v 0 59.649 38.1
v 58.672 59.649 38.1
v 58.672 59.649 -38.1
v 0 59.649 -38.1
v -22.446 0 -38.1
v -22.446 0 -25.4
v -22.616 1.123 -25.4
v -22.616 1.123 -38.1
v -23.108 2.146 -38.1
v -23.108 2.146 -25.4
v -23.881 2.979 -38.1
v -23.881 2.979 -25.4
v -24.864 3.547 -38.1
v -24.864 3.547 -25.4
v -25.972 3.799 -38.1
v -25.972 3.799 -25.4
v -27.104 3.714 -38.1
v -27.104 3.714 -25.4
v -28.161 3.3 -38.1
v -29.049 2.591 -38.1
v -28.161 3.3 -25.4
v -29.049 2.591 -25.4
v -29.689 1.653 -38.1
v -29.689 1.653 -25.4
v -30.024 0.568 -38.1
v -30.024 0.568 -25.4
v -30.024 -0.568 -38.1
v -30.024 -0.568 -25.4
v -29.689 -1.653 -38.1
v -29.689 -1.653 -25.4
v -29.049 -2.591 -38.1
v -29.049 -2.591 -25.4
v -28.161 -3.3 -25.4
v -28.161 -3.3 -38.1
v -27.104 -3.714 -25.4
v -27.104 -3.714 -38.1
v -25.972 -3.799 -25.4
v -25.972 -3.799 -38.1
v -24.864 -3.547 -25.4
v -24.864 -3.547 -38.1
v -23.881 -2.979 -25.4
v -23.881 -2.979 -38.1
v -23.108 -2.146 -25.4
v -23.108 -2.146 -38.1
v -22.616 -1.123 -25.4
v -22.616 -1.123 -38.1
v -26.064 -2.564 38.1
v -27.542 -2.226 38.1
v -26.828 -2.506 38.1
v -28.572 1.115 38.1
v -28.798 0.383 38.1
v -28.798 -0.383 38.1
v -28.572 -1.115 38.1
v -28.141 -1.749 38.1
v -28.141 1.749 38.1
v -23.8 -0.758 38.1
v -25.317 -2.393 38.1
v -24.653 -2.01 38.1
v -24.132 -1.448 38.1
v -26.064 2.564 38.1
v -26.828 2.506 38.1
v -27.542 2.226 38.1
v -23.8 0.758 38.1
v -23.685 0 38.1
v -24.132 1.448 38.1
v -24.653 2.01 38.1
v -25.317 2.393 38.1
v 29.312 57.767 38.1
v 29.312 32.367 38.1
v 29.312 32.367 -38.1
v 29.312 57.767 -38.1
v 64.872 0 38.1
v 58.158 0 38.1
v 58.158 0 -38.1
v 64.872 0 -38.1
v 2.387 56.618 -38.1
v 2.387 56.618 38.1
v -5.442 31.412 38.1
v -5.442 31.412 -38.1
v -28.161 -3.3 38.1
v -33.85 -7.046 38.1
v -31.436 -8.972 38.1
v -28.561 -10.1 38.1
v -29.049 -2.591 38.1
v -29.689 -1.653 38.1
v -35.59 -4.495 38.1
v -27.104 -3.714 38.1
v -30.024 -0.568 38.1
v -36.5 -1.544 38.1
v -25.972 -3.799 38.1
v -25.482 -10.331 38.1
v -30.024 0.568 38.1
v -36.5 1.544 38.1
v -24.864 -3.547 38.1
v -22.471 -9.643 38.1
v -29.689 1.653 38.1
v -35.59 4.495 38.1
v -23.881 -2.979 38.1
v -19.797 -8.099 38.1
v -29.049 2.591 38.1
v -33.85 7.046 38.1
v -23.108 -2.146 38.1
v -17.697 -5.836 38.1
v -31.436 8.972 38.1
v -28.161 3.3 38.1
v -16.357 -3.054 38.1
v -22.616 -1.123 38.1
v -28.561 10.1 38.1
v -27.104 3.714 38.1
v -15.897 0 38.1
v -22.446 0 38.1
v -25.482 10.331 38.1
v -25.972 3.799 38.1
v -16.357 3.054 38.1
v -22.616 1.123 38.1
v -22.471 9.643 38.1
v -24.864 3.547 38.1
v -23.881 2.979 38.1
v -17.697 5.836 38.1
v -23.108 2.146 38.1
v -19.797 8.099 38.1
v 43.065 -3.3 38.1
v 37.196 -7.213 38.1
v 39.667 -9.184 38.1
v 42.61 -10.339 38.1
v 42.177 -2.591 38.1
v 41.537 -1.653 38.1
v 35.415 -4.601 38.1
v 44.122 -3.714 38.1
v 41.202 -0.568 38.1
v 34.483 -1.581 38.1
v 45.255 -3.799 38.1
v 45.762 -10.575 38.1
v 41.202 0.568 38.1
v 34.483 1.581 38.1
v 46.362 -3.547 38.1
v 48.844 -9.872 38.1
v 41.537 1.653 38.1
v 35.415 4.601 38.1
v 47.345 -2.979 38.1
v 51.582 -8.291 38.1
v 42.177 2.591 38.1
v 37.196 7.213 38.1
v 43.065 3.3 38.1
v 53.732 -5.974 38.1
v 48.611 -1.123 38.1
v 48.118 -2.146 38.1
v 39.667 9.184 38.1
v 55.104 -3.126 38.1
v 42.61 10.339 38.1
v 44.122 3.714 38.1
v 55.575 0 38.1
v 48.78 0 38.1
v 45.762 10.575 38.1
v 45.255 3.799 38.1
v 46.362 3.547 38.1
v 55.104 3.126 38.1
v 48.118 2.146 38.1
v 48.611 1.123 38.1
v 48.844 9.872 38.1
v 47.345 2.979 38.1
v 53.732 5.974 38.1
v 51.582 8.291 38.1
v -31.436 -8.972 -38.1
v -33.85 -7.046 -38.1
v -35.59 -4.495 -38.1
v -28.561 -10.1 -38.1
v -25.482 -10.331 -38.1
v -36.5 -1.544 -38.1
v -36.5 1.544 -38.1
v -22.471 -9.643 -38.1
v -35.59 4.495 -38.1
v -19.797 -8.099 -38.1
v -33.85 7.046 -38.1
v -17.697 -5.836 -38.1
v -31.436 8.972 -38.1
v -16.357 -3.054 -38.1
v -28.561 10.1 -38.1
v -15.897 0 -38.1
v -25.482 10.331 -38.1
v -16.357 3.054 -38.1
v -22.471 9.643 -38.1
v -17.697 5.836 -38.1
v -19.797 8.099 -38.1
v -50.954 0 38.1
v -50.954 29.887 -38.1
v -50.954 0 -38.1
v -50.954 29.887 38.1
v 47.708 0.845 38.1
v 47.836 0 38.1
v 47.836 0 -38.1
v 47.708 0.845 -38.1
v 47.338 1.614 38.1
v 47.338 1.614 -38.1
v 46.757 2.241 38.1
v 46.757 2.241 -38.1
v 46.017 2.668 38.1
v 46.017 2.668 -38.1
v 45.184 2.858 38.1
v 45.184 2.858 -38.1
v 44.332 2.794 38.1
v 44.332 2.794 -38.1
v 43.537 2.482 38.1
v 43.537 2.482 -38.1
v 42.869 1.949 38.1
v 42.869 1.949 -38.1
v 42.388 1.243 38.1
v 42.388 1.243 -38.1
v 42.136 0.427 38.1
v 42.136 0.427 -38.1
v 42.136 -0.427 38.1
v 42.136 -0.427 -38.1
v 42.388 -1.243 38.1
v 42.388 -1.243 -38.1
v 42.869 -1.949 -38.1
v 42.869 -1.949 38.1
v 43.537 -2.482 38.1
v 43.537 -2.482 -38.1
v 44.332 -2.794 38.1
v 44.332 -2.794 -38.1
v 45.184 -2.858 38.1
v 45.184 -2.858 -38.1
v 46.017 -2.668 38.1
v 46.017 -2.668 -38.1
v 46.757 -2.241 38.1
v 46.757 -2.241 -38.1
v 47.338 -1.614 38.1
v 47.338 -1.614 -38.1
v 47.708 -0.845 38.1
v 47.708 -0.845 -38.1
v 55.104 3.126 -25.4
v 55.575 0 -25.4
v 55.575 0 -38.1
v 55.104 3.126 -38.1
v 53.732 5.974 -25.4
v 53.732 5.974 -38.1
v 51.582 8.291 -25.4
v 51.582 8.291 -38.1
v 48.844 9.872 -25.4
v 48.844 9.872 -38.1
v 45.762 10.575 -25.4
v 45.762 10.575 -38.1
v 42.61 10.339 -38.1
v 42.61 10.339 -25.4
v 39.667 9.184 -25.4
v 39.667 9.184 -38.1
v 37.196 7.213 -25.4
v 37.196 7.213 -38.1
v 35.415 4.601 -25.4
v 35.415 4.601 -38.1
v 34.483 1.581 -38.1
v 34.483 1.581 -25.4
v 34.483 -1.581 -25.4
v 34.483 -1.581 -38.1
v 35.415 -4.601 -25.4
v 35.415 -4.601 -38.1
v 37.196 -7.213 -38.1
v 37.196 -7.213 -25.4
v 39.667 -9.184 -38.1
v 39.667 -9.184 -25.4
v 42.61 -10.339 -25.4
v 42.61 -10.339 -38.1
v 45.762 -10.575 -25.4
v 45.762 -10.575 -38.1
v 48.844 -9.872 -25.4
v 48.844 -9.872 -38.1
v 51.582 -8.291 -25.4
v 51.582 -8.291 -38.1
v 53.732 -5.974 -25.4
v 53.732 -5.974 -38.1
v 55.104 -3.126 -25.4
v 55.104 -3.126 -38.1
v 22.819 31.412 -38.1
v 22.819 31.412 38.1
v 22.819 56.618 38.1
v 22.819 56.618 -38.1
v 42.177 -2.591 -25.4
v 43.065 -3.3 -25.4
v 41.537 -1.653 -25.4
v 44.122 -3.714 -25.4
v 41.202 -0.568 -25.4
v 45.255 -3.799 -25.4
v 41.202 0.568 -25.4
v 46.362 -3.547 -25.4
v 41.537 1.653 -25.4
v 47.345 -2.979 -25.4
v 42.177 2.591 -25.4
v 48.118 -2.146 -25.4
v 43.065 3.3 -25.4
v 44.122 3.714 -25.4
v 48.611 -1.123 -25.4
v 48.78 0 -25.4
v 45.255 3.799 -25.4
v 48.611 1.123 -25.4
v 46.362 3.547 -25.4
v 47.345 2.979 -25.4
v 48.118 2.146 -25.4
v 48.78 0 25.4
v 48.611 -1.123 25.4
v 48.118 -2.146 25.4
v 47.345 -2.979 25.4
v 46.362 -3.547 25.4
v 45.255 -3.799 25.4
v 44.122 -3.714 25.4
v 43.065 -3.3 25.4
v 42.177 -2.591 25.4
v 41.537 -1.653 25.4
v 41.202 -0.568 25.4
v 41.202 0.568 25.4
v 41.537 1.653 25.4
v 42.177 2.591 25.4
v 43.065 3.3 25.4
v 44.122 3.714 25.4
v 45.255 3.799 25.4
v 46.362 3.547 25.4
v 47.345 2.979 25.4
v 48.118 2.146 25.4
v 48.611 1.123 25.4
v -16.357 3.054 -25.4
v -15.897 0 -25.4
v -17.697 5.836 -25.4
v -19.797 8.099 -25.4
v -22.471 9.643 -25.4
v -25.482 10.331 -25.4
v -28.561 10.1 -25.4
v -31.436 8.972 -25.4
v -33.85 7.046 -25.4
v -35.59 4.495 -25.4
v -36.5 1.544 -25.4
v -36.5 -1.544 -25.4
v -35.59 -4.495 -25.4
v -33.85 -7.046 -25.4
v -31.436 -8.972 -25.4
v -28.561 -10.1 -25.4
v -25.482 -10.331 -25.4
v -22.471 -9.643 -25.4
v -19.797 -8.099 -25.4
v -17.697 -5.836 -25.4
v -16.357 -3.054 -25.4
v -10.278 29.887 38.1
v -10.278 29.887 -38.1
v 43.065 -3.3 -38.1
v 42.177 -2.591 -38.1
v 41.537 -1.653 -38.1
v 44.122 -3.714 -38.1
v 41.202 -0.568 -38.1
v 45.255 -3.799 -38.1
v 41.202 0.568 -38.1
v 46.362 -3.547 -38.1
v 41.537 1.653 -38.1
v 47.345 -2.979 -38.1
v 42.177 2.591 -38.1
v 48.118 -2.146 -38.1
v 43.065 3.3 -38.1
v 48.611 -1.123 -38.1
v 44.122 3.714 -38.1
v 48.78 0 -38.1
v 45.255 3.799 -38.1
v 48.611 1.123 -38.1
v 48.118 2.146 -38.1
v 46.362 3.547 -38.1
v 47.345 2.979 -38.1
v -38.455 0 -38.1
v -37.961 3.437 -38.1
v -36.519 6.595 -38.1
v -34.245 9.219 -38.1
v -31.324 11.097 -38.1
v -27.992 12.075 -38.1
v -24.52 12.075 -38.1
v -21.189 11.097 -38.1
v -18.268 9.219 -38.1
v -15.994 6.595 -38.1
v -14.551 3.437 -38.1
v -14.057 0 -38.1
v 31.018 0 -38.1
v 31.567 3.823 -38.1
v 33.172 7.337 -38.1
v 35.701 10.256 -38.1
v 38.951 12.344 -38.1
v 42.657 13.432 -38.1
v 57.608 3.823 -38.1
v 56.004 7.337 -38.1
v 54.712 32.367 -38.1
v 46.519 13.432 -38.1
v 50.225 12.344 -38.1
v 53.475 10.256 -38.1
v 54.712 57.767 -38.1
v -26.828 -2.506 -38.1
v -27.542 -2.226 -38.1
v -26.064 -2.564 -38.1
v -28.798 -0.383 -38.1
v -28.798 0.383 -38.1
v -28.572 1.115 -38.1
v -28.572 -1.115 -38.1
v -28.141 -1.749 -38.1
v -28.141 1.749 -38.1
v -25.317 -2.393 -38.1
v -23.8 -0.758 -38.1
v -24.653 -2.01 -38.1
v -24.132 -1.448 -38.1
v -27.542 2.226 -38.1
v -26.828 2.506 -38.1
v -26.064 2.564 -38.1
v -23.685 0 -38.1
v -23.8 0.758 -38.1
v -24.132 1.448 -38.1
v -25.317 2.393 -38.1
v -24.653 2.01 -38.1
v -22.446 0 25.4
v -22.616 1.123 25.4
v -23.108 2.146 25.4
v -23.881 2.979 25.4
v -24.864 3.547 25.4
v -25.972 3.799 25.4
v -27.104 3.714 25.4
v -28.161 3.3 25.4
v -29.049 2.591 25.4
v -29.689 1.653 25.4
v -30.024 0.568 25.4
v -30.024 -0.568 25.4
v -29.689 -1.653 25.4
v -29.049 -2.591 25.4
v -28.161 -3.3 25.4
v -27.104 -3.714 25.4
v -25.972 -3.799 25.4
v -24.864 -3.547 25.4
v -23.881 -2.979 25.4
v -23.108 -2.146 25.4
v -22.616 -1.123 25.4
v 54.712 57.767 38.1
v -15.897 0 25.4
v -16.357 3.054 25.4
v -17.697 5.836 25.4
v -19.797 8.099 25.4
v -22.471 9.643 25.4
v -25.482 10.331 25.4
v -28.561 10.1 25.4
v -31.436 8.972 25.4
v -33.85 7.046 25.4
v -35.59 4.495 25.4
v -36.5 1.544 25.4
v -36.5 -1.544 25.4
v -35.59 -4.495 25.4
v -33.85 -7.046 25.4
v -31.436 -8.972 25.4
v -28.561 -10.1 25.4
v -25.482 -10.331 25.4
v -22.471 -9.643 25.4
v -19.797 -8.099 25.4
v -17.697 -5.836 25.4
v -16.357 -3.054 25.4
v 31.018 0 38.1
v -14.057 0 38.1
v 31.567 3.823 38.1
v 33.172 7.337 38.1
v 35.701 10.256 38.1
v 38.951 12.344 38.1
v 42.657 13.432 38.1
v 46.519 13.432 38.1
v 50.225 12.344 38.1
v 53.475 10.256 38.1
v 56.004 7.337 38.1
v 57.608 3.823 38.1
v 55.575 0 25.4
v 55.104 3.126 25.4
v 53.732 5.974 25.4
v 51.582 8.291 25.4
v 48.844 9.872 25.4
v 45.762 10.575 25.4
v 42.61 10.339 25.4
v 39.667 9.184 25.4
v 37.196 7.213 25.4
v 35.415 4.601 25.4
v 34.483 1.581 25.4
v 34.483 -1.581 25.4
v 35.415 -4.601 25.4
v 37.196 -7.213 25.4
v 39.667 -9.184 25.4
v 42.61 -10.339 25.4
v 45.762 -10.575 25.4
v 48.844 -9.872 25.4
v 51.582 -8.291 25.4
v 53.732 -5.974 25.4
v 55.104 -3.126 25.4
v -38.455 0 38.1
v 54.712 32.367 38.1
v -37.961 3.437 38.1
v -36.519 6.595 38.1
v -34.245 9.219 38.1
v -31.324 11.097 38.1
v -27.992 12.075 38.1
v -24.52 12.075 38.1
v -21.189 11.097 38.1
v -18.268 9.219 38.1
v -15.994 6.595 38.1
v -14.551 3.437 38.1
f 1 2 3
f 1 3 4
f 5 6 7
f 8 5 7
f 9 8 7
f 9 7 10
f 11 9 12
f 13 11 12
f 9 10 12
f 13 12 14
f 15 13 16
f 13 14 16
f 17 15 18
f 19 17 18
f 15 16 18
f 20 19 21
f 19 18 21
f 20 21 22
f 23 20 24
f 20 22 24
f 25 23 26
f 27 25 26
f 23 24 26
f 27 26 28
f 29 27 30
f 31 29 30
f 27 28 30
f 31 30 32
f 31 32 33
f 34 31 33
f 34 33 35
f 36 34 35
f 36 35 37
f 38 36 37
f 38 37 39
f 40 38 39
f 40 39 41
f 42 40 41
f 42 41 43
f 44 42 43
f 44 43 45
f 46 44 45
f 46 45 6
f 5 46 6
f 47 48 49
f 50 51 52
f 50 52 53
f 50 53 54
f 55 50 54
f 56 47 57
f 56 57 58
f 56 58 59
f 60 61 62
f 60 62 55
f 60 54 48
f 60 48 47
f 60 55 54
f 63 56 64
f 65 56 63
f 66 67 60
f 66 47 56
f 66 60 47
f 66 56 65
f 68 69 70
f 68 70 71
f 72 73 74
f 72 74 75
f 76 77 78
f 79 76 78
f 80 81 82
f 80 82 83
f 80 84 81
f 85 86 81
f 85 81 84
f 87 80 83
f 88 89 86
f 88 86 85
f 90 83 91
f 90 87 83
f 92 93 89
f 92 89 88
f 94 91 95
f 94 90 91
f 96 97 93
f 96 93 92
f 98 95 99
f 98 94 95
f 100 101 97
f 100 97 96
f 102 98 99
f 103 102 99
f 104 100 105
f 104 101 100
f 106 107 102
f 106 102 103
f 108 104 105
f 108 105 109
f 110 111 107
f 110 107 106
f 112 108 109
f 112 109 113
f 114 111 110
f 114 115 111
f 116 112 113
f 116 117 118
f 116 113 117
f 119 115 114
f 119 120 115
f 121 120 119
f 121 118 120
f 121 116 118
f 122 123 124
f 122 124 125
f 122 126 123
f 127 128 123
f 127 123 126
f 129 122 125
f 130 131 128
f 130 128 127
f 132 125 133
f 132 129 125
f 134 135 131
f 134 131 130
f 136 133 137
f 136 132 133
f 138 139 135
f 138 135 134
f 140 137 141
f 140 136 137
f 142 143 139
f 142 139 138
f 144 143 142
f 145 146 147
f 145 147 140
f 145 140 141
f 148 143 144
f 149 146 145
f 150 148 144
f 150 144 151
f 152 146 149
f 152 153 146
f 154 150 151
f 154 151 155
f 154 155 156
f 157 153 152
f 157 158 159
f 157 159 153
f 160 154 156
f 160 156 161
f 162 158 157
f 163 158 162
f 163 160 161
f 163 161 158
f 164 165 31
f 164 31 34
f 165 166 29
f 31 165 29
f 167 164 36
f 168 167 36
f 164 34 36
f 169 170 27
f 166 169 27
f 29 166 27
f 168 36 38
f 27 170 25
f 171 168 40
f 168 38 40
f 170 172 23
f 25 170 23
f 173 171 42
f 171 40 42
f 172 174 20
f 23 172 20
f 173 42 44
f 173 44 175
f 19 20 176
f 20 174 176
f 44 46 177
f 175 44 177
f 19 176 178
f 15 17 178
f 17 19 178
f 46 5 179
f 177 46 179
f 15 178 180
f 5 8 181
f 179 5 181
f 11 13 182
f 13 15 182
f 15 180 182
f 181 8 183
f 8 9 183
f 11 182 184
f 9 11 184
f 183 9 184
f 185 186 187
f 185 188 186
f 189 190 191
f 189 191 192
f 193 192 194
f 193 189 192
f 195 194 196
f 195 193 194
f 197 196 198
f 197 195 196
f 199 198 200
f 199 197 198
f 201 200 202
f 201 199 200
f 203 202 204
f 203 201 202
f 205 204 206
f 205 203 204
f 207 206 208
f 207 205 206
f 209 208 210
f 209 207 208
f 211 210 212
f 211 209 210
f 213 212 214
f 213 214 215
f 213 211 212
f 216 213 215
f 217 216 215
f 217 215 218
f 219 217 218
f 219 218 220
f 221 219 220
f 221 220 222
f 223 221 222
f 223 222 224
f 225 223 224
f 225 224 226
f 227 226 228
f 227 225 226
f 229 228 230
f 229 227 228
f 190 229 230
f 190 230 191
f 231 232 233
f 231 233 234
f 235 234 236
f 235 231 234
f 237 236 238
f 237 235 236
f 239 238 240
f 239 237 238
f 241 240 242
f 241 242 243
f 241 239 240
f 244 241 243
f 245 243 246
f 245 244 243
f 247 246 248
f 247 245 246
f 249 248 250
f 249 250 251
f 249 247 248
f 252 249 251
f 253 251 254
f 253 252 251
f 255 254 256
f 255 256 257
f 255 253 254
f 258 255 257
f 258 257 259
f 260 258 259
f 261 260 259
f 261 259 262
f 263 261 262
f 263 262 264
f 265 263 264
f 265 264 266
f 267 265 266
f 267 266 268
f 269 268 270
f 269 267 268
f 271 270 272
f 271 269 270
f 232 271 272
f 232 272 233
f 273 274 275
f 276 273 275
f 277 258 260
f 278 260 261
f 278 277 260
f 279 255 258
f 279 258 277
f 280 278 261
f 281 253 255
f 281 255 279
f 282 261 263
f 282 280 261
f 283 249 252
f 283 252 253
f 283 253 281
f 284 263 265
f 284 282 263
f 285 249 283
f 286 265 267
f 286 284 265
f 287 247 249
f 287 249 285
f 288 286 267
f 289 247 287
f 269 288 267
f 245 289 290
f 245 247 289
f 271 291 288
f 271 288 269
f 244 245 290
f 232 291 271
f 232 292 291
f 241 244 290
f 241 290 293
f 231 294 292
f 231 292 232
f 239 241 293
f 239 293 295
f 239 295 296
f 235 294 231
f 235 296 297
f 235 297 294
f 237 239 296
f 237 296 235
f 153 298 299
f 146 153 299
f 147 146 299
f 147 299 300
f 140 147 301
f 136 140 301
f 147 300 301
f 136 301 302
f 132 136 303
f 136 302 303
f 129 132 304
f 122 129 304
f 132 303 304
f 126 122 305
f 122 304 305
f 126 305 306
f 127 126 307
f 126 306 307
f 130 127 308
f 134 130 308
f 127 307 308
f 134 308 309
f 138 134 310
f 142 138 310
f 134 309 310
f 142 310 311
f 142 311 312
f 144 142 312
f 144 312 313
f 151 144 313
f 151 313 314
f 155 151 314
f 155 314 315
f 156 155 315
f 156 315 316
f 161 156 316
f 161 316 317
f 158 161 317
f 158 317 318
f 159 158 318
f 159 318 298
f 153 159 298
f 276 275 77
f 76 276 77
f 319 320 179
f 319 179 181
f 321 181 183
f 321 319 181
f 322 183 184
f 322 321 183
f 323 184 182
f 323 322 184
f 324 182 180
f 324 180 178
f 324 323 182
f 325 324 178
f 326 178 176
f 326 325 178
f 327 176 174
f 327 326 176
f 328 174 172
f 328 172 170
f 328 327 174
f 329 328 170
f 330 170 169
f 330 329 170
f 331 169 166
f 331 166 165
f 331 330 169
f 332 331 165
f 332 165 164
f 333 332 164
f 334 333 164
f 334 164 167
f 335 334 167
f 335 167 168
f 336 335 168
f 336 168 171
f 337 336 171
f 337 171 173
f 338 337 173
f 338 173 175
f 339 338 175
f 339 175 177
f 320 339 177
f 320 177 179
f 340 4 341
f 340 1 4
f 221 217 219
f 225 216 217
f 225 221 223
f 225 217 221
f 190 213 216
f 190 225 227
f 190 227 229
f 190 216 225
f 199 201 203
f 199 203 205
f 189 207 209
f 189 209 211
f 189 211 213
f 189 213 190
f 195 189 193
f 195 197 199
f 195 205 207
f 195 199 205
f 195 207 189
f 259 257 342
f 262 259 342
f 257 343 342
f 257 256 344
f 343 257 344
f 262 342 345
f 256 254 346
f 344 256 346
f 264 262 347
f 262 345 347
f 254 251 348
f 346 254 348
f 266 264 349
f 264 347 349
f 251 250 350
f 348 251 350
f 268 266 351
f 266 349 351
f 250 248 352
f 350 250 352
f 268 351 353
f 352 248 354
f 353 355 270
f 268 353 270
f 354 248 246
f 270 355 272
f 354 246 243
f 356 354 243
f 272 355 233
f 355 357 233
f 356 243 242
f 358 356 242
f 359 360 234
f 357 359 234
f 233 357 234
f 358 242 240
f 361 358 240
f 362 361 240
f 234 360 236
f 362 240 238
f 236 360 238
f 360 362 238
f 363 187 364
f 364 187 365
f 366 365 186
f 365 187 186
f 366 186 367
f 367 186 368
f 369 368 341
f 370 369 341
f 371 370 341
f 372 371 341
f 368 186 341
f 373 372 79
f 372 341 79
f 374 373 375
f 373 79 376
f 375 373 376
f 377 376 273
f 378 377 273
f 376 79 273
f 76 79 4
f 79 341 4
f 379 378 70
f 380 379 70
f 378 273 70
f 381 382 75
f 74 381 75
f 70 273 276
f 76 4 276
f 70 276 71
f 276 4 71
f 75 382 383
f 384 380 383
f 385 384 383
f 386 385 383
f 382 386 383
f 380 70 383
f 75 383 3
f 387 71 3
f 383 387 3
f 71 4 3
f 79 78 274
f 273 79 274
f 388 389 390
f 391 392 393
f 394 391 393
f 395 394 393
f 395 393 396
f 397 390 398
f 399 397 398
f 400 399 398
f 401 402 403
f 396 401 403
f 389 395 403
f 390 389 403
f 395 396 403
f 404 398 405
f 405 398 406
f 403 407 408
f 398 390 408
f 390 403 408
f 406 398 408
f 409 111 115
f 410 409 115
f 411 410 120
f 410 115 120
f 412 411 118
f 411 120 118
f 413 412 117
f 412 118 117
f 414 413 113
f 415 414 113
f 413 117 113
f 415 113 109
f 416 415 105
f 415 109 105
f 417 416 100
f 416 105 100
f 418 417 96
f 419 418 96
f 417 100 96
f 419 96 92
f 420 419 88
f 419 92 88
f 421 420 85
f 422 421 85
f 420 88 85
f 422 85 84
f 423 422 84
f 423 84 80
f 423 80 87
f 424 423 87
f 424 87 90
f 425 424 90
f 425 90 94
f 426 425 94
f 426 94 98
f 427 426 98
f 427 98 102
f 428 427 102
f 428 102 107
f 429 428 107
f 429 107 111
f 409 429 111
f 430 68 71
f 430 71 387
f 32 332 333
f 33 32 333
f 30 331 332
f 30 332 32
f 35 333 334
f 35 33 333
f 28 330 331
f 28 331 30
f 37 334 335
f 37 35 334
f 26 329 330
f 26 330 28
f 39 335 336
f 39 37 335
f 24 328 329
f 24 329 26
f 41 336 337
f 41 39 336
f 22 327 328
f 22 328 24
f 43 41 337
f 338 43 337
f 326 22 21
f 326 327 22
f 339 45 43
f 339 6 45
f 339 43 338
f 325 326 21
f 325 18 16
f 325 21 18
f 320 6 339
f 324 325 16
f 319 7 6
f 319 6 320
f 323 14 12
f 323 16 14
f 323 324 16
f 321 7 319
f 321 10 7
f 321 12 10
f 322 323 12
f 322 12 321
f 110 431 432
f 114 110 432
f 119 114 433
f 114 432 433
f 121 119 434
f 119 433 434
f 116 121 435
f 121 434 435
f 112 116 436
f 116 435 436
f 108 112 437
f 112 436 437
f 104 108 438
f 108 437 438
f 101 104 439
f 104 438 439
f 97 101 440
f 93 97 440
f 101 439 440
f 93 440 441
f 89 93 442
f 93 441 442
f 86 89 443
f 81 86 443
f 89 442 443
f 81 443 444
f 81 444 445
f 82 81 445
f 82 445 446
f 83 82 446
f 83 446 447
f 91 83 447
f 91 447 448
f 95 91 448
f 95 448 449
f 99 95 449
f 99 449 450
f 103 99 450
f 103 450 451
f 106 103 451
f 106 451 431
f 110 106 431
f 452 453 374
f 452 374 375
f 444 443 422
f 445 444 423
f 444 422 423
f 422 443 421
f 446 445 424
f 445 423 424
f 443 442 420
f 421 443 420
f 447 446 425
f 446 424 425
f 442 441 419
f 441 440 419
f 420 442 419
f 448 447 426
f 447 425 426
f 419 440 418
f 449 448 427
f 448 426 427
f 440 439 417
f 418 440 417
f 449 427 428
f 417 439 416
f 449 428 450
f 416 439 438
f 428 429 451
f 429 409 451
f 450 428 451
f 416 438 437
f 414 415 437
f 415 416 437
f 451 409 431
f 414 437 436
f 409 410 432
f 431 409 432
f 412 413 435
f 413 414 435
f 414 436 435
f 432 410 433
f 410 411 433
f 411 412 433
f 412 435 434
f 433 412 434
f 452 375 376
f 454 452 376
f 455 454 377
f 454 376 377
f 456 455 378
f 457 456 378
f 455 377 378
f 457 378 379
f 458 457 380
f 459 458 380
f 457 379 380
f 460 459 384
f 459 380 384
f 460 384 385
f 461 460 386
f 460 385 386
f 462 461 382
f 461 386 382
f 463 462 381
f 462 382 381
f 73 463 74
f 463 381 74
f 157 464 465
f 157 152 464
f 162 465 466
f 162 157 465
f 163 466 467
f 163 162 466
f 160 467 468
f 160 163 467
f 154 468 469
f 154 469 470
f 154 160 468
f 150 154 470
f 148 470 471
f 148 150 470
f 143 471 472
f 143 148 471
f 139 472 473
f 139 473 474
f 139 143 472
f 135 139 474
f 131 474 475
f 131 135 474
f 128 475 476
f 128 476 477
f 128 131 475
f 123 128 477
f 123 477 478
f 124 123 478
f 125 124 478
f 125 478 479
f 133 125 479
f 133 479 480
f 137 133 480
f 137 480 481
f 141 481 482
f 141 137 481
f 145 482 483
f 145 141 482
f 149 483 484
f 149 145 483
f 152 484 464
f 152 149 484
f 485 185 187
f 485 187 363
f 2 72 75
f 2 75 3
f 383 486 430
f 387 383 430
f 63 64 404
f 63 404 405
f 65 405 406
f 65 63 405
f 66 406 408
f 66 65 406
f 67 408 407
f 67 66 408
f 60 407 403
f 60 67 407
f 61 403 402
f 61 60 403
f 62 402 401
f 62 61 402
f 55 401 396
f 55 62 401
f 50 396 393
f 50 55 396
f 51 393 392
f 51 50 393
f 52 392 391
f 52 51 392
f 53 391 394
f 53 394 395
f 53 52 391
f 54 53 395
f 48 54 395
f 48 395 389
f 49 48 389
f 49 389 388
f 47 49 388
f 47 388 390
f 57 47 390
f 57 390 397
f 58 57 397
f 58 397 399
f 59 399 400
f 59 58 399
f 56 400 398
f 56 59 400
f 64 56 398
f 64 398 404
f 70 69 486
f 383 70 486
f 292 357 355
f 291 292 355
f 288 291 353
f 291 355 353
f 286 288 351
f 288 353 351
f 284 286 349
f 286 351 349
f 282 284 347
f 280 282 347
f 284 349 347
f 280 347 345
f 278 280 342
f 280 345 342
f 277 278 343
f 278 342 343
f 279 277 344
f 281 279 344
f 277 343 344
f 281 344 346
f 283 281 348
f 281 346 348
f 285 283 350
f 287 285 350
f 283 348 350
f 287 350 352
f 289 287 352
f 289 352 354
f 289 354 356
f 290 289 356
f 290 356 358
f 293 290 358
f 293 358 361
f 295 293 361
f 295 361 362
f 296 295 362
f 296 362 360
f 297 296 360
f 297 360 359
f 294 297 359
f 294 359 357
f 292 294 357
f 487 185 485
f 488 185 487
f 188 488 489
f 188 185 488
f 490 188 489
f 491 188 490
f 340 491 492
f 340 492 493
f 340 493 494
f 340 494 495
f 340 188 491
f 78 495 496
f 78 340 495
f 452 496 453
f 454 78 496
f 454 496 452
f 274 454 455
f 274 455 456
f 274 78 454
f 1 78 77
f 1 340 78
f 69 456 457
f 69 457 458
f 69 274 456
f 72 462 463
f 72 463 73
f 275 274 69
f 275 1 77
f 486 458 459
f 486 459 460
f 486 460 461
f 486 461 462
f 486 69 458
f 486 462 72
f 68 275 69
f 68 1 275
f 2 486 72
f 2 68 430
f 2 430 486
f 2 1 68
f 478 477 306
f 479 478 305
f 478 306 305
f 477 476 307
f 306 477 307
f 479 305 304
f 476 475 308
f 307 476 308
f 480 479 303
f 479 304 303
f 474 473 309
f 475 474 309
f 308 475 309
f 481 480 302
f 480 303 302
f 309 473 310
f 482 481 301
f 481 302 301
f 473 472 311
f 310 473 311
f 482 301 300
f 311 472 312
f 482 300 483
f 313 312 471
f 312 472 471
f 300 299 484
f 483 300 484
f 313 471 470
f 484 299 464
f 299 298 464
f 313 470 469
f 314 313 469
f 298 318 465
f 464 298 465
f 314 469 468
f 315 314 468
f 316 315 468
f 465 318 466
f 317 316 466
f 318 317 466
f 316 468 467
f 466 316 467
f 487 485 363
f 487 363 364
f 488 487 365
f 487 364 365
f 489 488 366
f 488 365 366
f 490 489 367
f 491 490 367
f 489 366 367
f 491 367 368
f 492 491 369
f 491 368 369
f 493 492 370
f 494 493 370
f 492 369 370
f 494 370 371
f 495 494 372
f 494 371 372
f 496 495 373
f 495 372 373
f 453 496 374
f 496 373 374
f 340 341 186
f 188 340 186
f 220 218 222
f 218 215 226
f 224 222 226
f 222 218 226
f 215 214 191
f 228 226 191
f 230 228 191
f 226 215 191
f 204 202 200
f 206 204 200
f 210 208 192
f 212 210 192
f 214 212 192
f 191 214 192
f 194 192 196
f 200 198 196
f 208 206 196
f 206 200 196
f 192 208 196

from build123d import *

# Parameters (mm, degrees)
F1_DEPTH  = 38.1
F3_DEPTH  = 101.6
F5_DEPTH  = 101.6
F6_R      = 10.35962
F6_R_2    = 10.604866
F7_DEPTH  = 38.1
F8_R      = 3.81
F9_R      = 3.81
F10_DEPTH = 101.6
F11_R     = 3.81
F12_DEPTH = 76.2
F16_DEPTH = 76.2
F17_W     = 25.4
F17_H     = 25.4
F18_DEPTH = 76.2
F19_R     = 10.554888
F20_DEPTH = 25.4
F21_R     = 11.44653
F22_DEPTH = 25.4
F13_R     = 2.570806
F14_R     = 2.865914
F23_DEPTH = 76.2


with BuildPart() as f1:
    # F0 (on Top) → F1 (new body, symmetric)
    with BuildSketch(Plane.XY):
        Polygon((-50.954007, 29.886598), (-50.954007, 0), (64.872064, 0), (58.671523, 59.649188), (0, 59.649188), (-10.278472, 29.886598), align=None)
    extrude(amount=F1_DEPTH, both=True)

    # F2 (on face) → F3 (cut)
    with BuildSketch(Plane(origin=(0, 0, -38.1), x_dir=(1, 0, 0), z_dir=(0, 0, -1))):
        with BuildLine():
            Line((-38.455339, 0), (-14.057192, 0))
            ThreePointArc((-14.057192, 0), (-26.256265, 12.199074), (-38.455339, 0))
        make_face()
        with BuildLine():
            ThreePointArc((-38.455339, 0), (-26.256265, -12.199074), (-14.057192, 0))
            Line((-14.057192, 0), (-38.455339, 0))
        make_face()
    extrude(amount=-F3_DEPTH, mode=Mode.SUBTRACT)

    # F4 (on face) → F5 (cut)
    with BuildSketch(Plane(origin=(0, 0, -38.1), x_dir=(1, 0, 0), z_dir=(0, 0, -1))):
        with BuildLine():
            ThreePointArc((31.017694, 0), (44.58791, -13.570216), (58.158127, 0))
            Line((58.158127, 0), (31.017694, 0))
        make_face()
        with BuildLine():
            Line((31.017694, 0), (58.158127, 0))
            ThreePointArc((58.158127, 0), (44.58791, 13.570216), (31.017694, 0))
        make_face()
    extrude(amount=-F5_DEPTH, mode=Mode.SUBTRACT)

    # F15 (on face) → F16 (cut)
    with BuildSketch(Plane.XY.offset(38.1)):
        Polygon((2.386932, 56.618057), (-5.442208, 31.412043), (0, 31.412043), (22.819083, 31.412043), (22.819083, 56.618057), align=None)
    extrude(amount=-F16_DEPTH, mode=Mode.SUBTRACT)

    # F17 (on face) → F18 (cut)
    with BuildSketch(Plane.XY.offset(38.1)):
        with Locations((42.011538, 45.066816)):
            Rectangle(F17_W, F17_H)
    extrude(amount=-F18_DEPTH, mode=Mode.SUBTRACT)


with BuildPart() as f7:
    # F6 (on Top) → F7 (new body, symmetric)
    with BuildSketch(Plane.XY):
        with Locations((-26.256265, 0)):
            Circle(F6_R)
        with Locations((44.969819, 0)):
            Circle(F6_R_2)
    extrude(amount=F7_DEPTH, both=True)

    # F8 (on face) + F9 (on face) → F10 (cut)
    with BuildSketch(Plane.XY.offset(38.1)):
        with Locations((-26.256265, 0)):
            Circle(F8_R)
    with BuildSketch(Plane(origin=(0, 0, -38.1), x_dir=(1, 0, 0), z_dir=(0, 0, -1))):
        with Locations((44.969819, 0)):
            Circle(F9_R)
    extrude(amount=-F10_DEPTH, mode=Mode.SUBTRACT)

    # F11 (on face) → F12 (cut)
    with BuildSketch(Plane.XY.offset(38.1)):
        with Locations((44.969819, 0)):
            Circle(F11_R)
    extrude(amount=-F12_DEPTH, mode=Mode.SUBTRACT)

    # F19 (on Top) → F20 (cut, symmetric)
    with BuildSketch(Plane.XY):
        with Locations((-26.256265, 0)):
            Circle(F19_R)
    extrude(amount=F20_DEPTH, both=True, mode=Mode.SUBTRACT)

    # F21 (on Top) → F22 (cut, symmetric)
    with BuildSketch(Plane.XY):
        with Locations((44.969823, 0)):
            Circle(F21_R)
    extrude(amount=F22_DEPTH, both=True, mode=Mode.SUBTRACT)


with BuildPart() as f23:
    # F13 (on face) + F14 (on face) → F23 (new body)
    with BuildSketch(Plane.XY.offset(38.1)):
        with Locations((-26.256265, 0)):
            Circle(F13_R)
    with BuildSketch(Plane.XY.offset(38.1)):
        with Locations((44.969819, 0)):
            Circle(F14_R)
    extrude(amount=-F23_DEPTH)


solid = Compound([f1.part, f7.part, f23.part])
